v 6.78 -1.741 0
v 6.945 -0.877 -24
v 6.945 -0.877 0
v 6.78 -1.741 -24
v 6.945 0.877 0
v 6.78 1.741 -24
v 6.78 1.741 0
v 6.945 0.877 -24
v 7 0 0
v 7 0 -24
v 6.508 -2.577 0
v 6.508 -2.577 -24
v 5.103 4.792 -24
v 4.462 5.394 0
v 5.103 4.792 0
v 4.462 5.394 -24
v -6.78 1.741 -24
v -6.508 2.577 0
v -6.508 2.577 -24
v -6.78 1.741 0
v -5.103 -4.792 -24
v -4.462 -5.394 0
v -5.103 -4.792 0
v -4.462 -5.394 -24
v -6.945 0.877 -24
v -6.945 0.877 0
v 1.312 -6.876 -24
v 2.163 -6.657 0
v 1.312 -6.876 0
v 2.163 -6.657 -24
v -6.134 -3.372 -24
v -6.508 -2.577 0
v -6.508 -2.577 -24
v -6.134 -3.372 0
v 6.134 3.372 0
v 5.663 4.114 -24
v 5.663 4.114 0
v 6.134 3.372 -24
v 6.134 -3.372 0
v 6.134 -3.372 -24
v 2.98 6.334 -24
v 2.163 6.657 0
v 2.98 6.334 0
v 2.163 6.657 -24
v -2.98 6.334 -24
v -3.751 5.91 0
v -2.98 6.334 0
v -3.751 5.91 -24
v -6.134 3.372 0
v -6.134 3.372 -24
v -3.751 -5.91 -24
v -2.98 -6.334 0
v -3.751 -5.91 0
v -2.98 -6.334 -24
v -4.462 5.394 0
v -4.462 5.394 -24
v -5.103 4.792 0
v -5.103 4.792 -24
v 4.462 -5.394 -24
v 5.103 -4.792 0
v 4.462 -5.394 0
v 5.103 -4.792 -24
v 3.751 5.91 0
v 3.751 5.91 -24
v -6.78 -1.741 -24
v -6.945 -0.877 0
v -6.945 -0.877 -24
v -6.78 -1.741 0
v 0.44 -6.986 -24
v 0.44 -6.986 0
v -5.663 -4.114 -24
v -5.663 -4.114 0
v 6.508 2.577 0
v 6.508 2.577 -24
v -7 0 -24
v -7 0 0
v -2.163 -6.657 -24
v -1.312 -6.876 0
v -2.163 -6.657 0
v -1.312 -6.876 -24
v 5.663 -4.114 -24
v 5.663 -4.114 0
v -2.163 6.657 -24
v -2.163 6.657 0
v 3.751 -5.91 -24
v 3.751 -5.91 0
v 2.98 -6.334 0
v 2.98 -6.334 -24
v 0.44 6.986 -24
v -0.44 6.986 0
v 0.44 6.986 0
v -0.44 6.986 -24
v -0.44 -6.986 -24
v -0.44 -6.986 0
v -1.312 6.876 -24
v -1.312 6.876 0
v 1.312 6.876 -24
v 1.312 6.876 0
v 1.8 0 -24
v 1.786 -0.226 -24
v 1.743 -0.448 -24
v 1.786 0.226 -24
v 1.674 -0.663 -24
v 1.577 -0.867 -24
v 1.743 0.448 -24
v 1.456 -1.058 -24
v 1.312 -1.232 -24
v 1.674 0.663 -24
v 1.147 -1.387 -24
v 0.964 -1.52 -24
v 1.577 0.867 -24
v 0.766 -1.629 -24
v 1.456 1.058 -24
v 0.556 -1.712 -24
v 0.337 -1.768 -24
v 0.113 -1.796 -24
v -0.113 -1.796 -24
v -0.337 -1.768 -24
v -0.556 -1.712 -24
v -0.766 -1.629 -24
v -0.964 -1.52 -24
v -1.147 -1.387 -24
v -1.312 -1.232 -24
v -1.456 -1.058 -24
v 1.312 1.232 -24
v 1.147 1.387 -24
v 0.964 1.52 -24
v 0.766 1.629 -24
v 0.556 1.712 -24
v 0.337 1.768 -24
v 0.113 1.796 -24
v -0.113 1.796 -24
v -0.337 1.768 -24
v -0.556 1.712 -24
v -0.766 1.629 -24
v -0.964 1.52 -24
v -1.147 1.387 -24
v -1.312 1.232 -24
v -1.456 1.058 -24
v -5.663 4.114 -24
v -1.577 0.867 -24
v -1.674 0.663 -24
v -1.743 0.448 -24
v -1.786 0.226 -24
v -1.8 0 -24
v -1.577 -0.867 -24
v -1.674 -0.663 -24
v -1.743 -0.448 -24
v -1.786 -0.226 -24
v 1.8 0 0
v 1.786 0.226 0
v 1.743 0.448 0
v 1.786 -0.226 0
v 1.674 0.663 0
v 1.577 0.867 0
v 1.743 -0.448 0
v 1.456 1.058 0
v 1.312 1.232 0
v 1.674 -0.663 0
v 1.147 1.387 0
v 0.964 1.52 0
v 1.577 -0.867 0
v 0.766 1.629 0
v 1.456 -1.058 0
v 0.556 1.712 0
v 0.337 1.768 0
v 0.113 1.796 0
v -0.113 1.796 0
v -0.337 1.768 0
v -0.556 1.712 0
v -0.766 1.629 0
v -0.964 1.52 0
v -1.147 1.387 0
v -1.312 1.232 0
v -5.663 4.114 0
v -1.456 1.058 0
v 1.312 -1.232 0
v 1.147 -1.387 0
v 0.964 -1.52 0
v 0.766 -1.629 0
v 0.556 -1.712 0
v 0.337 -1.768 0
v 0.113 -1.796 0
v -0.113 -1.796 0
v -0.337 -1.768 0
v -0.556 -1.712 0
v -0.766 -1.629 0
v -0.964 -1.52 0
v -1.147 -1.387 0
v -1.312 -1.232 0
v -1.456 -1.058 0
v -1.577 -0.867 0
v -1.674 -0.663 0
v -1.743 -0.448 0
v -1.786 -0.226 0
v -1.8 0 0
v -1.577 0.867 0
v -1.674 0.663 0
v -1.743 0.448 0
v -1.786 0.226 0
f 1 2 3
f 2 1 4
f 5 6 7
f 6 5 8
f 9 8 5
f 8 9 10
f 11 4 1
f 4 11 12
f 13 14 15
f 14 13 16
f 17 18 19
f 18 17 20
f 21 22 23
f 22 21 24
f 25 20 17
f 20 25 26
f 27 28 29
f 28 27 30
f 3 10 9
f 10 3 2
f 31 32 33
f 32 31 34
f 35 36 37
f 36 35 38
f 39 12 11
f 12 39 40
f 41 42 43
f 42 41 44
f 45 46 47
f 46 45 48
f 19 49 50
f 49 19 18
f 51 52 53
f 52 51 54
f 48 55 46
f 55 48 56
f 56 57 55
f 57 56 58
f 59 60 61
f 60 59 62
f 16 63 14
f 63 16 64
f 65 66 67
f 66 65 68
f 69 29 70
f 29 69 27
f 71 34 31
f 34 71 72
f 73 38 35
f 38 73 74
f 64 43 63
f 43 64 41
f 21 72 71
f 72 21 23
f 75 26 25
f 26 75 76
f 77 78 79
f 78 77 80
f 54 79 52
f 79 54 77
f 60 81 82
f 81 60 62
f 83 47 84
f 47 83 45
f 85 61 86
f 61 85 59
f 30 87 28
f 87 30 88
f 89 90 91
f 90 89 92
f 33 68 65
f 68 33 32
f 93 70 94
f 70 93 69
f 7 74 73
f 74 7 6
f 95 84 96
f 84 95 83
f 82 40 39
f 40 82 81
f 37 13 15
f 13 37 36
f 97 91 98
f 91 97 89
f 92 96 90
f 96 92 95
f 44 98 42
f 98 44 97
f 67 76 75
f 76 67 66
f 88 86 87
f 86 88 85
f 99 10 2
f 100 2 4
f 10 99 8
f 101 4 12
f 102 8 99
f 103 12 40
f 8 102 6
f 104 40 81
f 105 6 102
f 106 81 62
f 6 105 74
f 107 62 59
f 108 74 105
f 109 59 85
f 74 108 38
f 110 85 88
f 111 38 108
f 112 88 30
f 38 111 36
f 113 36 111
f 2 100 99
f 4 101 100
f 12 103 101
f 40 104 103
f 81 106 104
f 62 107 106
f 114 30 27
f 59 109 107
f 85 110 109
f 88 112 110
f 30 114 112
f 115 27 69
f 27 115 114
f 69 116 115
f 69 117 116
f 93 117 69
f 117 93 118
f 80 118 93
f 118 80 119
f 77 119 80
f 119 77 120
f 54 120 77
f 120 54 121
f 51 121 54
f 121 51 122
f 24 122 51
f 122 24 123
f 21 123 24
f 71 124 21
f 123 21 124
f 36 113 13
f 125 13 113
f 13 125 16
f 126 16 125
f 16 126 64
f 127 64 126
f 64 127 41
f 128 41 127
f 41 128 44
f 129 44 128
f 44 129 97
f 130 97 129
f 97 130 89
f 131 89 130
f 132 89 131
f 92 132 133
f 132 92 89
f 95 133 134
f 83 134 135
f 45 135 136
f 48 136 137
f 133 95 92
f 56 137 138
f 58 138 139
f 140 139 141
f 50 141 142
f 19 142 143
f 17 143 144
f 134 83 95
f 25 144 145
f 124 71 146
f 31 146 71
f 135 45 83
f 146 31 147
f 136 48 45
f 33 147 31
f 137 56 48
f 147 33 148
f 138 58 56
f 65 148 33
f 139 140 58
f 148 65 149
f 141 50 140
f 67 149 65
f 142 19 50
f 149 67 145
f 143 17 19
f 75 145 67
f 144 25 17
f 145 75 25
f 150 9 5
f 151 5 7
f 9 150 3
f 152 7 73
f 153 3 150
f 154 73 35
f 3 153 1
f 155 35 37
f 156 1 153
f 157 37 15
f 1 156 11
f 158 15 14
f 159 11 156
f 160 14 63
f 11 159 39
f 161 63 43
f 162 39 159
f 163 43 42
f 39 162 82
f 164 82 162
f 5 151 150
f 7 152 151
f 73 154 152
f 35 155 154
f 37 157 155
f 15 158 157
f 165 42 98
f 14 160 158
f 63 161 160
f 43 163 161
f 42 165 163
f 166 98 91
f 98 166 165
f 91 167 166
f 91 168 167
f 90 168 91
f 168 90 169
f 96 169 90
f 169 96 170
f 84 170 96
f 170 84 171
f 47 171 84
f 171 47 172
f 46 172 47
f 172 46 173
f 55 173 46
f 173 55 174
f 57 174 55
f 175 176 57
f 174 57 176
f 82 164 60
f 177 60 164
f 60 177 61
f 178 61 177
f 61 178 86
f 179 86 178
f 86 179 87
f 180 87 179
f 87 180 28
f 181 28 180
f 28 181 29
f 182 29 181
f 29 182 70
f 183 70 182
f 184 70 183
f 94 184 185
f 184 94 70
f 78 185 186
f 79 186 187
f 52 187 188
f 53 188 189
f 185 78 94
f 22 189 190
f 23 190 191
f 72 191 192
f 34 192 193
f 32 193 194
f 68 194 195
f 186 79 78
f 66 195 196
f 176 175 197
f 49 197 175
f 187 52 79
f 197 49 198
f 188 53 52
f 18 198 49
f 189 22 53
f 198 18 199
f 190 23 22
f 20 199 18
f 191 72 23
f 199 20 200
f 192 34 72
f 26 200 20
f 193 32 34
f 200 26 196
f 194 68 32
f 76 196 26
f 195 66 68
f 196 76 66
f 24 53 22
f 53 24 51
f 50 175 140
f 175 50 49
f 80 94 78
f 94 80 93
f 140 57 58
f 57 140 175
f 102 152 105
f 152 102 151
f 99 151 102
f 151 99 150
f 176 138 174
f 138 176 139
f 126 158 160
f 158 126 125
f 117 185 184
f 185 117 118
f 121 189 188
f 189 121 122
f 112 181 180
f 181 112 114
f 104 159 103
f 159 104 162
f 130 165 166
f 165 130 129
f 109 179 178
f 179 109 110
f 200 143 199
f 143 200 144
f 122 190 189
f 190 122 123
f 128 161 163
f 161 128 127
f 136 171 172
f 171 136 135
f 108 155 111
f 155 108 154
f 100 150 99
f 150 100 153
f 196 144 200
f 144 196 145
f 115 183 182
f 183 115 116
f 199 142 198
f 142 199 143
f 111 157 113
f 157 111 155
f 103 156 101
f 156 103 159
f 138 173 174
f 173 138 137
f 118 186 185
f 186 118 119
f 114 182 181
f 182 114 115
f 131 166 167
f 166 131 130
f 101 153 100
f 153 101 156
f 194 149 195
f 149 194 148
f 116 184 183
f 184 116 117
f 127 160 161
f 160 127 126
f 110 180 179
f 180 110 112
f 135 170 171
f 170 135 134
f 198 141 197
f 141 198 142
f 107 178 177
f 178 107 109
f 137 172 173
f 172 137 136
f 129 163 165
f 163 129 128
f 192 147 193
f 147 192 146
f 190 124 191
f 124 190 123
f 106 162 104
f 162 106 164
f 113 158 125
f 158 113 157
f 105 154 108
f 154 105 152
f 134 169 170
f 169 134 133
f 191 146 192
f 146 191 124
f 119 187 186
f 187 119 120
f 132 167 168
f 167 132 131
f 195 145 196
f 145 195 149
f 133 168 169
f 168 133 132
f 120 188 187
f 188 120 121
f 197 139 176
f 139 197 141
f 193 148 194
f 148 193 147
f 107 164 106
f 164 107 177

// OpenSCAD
$fn = 50;


difference() {
	union() {
		translate(v = [0, 0, -24.0000000000]) {
			cylinder(h = 24, r = 7.0000000000);
		}
	}
	union() {
		#translate(v = [0, 0, -24]) {
			cylinder(h = 24, r = 1.8000000000);
		}
	}
}
